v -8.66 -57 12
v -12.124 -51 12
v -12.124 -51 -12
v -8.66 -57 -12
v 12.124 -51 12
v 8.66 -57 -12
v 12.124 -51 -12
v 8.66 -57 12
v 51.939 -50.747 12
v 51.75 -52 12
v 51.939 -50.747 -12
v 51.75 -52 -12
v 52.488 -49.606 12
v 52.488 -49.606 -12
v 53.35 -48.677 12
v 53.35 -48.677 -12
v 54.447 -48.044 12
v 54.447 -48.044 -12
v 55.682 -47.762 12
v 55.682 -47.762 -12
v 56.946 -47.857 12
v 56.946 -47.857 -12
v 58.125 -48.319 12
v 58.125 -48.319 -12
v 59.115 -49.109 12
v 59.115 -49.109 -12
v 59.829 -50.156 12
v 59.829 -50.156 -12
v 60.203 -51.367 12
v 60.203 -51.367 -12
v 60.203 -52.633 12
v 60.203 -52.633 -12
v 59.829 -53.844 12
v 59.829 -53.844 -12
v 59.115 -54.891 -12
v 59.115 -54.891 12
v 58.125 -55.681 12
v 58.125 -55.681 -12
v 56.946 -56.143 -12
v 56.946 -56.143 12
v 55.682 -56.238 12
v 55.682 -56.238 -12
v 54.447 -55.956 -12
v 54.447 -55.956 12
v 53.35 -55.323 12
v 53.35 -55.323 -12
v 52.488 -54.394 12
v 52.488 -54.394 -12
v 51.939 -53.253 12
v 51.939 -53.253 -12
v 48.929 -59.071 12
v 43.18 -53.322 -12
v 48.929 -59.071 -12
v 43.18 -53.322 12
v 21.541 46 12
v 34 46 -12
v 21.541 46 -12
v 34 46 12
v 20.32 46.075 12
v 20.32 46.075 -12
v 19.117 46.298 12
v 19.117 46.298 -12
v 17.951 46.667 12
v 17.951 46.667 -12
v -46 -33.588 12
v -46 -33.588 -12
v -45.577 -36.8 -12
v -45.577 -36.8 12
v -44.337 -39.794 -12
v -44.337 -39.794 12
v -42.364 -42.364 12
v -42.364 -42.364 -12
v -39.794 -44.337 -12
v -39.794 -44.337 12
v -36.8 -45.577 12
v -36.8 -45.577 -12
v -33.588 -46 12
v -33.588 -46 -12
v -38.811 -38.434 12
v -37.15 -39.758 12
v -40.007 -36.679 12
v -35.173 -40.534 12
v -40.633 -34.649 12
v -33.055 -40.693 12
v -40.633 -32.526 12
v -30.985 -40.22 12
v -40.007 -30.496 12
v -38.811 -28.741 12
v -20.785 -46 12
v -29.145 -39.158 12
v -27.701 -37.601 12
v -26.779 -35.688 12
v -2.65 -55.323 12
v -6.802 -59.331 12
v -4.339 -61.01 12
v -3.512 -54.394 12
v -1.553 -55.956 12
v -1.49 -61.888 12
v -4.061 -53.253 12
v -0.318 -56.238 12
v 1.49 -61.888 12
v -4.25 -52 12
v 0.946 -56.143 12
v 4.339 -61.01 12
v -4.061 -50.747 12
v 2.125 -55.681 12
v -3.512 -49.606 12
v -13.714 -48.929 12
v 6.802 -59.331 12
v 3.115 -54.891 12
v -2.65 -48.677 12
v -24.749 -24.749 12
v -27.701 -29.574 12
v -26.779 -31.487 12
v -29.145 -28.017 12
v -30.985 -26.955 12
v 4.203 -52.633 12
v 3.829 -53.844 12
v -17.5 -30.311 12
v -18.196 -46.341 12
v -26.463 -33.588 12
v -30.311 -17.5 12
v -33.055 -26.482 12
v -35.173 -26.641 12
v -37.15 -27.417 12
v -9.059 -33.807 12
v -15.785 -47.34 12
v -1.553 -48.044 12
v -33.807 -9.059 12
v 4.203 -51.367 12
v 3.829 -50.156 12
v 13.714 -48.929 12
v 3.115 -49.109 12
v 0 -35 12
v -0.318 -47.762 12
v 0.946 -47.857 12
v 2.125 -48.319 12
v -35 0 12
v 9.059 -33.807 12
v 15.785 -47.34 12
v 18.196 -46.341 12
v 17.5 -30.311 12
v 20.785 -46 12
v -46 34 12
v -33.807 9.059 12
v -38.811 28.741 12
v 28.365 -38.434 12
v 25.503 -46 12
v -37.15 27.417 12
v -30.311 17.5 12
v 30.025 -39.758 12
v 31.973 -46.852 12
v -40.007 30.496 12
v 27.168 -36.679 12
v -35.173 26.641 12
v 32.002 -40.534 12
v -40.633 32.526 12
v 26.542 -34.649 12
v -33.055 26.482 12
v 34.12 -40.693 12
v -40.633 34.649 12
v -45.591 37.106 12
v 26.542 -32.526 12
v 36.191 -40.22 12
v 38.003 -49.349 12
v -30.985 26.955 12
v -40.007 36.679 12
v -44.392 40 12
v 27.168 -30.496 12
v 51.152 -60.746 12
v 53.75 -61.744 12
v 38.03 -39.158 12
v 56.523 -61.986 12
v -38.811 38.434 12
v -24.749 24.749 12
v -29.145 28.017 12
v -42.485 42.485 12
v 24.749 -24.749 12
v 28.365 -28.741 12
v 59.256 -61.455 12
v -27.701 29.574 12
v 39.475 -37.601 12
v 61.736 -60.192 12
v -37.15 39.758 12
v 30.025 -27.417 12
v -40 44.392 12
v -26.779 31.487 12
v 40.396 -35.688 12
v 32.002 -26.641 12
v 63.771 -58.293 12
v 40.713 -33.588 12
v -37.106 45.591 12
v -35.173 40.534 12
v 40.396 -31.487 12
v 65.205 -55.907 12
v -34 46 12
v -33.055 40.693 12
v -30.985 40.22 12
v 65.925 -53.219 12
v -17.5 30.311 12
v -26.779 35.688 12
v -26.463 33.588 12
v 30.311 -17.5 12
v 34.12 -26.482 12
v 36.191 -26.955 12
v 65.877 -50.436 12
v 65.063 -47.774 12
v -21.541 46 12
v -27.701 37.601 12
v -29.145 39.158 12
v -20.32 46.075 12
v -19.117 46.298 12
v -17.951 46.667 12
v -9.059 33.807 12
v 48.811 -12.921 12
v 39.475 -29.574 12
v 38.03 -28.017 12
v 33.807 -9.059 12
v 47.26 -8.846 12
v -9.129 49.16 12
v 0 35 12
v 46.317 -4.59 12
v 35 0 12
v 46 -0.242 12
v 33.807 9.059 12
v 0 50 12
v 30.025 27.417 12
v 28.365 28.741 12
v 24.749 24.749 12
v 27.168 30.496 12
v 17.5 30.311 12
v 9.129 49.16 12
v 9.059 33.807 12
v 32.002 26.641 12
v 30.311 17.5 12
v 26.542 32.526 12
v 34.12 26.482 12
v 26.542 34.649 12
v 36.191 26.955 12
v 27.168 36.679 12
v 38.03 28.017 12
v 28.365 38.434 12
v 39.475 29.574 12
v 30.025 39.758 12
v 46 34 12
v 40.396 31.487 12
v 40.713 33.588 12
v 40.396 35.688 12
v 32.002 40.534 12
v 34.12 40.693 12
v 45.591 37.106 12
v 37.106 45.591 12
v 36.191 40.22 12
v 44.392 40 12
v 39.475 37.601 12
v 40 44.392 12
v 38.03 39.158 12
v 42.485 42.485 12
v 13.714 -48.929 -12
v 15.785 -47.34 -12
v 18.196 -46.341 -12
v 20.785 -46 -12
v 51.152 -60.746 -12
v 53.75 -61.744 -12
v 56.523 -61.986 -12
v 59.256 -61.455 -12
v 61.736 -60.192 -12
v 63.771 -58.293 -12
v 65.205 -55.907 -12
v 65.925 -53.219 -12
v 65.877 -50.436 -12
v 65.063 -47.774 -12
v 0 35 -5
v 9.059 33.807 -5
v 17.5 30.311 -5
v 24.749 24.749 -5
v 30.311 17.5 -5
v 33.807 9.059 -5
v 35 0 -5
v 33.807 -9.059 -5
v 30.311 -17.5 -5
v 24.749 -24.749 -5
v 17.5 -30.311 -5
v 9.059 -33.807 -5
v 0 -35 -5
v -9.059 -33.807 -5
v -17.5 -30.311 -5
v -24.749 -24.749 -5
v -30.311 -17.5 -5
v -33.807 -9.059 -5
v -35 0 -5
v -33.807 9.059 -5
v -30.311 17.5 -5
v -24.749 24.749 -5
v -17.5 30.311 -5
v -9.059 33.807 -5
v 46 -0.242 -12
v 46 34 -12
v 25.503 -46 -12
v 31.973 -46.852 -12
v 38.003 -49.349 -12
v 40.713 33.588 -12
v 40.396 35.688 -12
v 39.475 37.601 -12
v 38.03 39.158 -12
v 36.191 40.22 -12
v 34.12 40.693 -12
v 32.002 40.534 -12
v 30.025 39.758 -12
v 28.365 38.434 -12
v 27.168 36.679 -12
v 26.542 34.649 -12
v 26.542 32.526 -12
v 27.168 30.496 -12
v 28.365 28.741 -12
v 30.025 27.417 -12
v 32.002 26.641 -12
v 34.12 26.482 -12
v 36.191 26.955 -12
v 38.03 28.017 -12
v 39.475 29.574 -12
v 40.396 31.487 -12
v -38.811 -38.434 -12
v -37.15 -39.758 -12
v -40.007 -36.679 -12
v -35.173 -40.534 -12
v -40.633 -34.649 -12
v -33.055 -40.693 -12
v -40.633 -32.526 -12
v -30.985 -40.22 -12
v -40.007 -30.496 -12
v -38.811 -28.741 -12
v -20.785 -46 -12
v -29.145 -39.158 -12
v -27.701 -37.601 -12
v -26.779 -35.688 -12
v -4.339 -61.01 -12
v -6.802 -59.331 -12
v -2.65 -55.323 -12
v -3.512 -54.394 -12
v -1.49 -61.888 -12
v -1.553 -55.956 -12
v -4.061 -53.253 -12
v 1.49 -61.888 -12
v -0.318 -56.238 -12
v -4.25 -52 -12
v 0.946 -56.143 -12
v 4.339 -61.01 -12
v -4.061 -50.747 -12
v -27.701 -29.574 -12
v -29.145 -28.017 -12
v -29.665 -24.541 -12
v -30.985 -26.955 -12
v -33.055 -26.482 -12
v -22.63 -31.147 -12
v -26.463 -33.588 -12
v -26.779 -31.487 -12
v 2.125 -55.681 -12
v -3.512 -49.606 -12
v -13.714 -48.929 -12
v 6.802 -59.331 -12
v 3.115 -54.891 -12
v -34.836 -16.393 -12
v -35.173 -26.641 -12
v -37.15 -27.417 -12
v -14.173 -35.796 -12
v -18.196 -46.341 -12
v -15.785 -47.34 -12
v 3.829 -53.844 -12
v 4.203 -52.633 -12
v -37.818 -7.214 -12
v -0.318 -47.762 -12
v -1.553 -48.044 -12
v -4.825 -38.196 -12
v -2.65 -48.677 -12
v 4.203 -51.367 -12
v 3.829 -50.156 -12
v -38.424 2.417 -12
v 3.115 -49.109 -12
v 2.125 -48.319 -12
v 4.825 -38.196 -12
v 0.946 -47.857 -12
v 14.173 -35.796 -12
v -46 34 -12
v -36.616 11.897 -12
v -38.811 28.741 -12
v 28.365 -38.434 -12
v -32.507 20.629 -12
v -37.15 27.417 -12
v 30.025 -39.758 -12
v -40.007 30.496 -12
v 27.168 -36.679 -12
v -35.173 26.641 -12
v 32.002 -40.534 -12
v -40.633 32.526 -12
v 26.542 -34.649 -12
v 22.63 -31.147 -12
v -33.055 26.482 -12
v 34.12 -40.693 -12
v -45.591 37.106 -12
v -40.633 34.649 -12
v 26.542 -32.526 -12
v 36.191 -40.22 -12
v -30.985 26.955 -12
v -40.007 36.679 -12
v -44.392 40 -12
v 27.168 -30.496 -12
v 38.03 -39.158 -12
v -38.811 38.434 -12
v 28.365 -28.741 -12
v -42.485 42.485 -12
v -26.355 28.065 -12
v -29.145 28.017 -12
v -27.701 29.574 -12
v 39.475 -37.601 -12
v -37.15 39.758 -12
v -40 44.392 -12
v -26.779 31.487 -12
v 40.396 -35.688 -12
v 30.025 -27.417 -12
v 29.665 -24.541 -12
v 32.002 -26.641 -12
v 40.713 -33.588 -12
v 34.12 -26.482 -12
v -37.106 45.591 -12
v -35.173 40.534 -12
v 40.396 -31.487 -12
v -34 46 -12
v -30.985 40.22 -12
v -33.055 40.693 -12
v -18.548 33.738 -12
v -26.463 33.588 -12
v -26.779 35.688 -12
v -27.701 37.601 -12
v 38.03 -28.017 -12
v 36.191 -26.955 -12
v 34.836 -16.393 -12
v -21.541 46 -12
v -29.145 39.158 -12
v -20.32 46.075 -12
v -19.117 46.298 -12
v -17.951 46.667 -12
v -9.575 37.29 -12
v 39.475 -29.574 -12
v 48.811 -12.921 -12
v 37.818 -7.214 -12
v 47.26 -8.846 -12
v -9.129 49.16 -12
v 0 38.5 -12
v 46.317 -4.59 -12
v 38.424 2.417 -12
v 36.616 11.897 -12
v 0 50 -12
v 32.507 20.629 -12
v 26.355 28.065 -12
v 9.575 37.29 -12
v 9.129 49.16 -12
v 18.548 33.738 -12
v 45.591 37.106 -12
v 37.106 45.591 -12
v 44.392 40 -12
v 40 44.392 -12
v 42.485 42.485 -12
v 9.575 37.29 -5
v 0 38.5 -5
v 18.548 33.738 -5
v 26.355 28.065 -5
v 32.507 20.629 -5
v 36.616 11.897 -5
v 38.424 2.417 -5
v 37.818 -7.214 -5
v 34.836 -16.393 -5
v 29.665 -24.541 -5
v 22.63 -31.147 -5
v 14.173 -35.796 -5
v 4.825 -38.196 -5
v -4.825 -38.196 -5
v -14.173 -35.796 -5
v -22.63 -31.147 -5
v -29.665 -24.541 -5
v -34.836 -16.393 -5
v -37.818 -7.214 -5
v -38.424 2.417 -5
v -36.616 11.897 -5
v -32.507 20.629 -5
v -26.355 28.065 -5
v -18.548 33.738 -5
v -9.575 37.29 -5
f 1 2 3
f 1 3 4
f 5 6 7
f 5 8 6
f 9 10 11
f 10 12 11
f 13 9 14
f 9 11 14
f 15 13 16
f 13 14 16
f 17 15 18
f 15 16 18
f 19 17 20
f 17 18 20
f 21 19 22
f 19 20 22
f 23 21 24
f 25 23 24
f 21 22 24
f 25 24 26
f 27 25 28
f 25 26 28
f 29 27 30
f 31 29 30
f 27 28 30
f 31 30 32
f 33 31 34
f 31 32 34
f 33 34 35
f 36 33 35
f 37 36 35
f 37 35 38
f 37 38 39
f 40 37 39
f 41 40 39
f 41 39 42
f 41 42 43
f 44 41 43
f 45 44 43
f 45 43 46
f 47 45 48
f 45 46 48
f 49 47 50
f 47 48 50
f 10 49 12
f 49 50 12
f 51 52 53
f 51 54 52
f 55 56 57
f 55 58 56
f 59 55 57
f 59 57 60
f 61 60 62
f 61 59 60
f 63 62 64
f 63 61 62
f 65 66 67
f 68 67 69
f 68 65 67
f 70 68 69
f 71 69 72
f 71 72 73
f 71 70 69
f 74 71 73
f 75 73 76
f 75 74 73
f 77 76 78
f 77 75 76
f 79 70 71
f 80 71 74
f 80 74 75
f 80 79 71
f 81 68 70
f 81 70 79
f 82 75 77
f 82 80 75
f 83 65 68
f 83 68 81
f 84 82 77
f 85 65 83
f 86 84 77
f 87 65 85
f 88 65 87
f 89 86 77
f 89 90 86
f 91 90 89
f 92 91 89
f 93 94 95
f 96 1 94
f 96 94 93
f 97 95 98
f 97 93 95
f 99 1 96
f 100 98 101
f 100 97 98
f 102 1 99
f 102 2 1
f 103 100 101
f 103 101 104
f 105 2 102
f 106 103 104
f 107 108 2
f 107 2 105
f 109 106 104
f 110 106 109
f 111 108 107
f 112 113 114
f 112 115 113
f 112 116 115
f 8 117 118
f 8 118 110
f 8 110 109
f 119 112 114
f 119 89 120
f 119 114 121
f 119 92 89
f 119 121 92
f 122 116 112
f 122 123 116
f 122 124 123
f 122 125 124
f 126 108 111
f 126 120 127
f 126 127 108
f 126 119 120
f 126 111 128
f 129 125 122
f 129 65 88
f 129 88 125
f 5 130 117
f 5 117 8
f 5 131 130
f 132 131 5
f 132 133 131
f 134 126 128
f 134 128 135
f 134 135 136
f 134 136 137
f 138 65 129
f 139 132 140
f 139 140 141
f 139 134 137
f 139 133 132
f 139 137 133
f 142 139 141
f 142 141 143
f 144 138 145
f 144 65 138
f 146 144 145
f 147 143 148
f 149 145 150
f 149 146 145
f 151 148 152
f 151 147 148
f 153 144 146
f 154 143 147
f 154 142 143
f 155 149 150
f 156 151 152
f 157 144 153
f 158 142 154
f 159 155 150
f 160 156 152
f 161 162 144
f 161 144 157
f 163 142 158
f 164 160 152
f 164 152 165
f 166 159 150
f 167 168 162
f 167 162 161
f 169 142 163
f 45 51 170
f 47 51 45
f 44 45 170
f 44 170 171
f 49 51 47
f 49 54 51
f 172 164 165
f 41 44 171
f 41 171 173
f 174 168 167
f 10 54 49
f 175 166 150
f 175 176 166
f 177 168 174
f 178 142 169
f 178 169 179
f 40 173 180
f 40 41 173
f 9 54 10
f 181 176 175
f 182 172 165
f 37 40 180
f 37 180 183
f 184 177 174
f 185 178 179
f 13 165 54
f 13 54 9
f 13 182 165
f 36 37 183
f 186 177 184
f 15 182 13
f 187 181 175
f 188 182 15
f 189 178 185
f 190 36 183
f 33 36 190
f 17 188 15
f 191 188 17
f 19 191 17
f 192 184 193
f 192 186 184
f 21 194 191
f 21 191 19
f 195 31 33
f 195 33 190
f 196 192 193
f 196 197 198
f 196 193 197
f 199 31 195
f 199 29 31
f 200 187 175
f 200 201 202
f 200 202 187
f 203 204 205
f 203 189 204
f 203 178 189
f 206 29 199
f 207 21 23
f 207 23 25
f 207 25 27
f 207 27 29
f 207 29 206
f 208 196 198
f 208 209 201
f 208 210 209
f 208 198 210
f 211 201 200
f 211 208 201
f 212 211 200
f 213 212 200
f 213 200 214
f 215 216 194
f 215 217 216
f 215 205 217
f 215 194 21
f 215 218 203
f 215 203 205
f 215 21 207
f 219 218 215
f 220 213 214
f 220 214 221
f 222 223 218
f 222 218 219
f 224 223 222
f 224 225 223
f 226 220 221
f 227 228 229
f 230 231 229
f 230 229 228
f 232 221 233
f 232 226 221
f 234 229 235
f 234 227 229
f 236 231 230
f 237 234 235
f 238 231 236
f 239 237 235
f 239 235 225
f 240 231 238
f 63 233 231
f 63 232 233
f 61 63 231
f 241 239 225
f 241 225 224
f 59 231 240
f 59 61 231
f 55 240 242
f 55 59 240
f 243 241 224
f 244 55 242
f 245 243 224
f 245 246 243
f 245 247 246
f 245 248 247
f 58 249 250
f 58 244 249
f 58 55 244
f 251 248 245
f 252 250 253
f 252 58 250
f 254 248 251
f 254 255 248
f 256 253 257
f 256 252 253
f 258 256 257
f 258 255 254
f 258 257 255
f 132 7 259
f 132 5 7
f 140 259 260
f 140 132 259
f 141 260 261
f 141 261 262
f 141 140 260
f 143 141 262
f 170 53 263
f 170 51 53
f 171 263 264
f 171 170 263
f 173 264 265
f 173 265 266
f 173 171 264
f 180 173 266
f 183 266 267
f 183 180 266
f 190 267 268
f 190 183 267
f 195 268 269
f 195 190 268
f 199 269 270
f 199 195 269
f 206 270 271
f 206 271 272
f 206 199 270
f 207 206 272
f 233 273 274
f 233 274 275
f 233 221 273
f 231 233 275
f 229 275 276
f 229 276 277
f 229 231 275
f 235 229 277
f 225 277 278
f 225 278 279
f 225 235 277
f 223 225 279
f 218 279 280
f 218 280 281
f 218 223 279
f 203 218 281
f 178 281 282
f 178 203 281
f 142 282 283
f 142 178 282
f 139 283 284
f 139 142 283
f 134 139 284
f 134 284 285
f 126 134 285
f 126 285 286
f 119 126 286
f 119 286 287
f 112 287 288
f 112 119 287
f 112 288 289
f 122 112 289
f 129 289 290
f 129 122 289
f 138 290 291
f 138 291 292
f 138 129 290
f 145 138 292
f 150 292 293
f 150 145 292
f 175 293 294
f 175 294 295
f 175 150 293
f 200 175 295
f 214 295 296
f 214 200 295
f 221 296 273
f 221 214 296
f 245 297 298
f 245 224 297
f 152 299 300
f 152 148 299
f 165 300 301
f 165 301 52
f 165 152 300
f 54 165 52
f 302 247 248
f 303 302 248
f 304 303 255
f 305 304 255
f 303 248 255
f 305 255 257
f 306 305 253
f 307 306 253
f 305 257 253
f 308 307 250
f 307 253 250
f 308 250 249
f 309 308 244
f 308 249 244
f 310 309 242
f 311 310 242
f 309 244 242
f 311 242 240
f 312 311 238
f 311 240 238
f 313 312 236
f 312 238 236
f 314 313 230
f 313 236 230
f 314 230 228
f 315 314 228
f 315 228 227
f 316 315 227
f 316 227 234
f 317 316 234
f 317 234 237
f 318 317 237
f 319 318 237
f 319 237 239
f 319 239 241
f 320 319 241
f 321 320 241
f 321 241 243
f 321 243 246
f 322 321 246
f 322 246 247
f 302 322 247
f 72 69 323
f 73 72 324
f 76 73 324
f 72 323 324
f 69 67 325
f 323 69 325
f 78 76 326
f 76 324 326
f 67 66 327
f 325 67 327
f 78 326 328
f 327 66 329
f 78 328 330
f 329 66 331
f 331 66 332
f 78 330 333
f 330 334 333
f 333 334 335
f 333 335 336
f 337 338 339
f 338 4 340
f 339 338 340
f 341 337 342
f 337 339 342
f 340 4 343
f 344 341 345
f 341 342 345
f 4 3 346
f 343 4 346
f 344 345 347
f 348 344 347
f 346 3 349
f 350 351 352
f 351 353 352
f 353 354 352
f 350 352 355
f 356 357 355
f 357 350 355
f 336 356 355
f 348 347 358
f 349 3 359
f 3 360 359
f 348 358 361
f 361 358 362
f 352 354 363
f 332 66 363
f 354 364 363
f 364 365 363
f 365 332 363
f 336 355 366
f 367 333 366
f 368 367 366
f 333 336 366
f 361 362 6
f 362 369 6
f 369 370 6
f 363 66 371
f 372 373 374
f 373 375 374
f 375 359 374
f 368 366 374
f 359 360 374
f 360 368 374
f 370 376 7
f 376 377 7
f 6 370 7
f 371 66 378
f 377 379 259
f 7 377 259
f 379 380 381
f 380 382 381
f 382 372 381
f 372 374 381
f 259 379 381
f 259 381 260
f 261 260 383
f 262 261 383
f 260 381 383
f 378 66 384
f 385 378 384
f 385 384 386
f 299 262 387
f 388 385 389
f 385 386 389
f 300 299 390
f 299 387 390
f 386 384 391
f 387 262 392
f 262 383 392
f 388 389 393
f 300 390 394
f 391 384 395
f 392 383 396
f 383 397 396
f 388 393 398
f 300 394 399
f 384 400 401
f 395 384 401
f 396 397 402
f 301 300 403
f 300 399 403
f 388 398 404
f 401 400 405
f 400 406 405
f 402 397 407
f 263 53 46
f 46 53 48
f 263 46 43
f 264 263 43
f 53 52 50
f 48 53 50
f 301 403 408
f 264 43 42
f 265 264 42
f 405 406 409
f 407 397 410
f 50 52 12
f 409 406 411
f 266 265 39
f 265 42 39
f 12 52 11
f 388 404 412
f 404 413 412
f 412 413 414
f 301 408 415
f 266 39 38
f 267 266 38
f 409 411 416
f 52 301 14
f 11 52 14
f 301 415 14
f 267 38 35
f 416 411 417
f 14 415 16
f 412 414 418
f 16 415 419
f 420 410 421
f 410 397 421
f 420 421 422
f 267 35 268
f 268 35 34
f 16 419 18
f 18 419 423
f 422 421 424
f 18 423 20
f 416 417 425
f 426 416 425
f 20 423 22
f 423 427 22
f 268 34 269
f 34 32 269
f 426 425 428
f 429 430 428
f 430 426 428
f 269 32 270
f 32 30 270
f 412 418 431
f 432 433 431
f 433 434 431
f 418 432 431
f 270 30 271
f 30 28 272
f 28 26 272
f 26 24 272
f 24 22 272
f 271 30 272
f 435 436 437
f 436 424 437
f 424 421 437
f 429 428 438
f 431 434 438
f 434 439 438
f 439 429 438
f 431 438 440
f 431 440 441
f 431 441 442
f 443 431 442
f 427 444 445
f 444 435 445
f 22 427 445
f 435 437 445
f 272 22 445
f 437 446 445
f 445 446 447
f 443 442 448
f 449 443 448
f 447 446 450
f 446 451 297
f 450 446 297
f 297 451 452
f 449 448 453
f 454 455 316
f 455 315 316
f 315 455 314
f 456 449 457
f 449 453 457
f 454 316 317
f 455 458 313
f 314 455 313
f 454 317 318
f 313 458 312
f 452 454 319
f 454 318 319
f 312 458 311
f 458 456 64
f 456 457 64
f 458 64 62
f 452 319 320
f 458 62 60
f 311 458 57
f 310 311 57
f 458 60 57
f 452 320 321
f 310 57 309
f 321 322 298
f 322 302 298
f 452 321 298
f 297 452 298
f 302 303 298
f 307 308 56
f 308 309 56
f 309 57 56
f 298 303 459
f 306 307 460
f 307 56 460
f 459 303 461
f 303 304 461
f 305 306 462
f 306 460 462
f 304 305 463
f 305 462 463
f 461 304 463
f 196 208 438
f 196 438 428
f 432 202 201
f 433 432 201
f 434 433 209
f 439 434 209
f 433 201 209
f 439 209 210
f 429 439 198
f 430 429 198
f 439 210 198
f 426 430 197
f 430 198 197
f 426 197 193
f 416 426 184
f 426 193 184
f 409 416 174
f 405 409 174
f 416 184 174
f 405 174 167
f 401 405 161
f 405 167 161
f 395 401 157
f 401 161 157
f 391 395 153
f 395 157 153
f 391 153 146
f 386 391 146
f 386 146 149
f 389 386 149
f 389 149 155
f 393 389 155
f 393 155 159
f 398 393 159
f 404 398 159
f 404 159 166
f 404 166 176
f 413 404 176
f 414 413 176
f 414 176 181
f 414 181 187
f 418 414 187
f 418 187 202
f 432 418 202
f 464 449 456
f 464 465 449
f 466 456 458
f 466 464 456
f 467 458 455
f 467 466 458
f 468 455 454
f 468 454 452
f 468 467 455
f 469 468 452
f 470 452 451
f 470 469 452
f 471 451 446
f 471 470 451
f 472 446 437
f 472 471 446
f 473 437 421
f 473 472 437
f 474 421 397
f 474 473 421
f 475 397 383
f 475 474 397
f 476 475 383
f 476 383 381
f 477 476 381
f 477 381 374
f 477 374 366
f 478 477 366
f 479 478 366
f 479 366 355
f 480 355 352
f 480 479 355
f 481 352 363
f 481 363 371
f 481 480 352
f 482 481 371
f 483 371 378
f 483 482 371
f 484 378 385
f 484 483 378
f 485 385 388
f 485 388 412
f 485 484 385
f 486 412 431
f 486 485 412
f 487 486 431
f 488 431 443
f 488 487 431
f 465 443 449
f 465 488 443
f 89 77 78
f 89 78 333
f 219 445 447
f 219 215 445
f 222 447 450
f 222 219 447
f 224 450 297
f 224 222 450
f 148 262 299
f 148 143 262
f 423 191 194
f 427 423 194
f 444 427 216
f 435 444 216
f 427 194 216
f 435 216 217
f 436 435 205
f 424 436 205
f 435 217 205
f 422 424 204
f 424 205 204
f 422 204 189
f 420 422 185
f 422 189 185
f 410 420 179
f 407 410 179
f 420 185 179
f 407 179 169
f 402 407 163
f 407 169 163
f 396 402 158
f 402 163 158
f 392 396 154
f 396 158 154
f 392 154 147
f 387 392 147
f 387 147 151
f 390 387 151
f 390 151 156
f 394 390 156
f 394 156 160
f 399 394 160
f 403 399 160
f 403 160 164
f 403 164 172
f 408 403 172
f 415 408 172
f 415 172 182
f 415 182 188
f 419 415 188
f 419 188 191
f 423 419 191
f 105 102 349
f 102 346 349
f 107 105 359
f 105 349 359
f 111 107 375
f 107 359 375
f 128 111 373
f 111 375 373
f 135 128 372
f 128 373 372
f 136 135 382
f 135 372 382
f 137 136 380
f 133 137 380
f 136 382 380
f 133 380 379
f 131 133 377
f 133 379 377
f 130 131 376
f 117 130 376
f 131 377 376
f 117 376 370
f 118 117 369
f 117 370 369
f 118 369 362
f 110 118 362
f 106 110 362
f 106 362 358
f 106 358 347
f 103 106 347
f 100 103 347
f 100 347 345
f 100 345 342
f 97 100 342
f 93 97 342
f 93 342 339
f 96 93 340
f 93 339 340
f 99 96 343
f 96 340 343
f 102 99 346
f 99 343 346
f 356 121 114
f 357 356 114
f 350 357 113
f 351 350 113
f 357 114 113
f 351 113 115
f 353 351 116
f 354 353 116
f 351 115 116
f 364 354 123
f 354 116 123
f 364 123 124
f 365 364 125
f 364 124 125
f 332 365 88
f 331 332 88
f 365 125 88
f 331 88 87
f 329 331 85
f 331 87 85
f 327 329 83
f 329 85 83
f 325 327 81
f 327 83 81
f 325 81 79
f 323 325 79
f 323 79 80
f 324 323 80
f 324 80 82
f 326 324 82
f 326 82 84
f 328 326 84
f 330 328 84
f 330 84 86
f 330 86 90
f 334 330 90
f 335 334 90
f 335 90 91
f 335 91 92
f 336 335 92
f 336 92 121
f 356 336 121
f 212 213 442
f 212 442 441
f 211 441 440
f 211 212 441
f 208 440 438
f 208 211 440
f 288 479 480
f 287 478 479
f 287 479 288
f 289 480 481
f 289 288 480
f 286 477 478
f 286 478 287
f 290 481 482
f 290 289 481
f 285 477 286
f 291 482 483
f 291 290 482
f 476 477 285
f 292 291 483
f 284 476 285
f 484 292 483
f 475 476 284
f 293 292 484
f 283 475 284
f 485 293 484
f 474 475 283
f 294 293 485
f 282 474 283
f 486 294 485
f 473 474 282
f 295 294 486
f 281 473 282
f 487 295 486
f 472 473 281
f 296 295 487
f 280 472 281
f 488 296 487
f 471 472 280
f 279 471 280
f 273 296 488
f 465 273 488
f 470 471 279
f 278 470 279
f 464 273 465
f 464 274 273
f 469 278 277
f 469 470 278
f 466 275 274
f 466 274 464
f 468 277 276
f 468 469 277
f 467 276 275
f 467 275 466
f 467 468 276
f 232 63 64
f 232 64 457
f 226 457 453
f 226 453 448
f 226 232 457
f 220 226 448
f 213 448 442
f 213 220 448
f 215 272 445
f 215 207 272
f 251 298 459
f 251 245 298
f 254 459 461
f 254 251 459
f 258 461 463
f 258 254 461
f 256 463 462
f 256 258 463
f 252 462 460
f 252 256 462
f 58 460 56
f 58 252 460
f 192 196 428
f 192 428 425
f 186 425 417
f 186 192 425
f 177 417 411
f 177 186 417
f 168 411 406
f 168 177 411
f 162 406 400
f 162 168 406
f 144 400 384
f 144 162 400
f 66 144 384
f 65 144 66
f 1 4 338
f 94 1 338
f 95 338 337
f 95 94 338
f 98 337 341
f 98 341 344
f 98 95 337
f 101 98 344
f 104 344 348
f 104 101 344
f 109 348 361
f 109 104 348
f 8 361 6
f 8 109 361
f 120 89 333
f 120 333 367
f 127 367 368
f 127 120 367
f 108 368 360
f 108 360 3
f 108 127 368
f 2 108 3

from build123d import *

# Parameters (mm, degrees)
SKETCH1_R              = 31
BASE_EXTRUDE_DEPTH     = 12
M10_GEVINDHULLER_D     = 8.5
M10_GEVINDHULLER_DEPTH = 24
M10_GEVINDHULLER_TIP   = 2.553657631
SKETCH7_R              = 7.125
F_14_25_HULLER_DEPTH   = 25


with BuildPart() as part:
    # Sketch1 → Base-Extrude (new body, symmetric)
    with BuildSketch(Plane.XY):
        with BuildLine():
            Line((34, 46), (21.540659229, 46))
            ThreePointArc((21.540659229, 46), (19.71491737, 46.168079197), (17.950549357, 46.666666667))
            ThreePointArc((17.950549357, 46.666666667), (0, 50), (-17.950549357, 46.666666667))
            ThreePointArc((-17.950549357, 46.666666667), (-19.71491737, 46.168079197), (-21.540659229, 46))
            Line((-21.540659229, 46), (-34, 46))
            ThreePointArc((-34, 46), (-42.485281374, 42.485281374), (-46, 34))
            Line((-46, 34), (-46, 0))
            Line((-46, 0), (-46, -33.587572106))
            ThreePointArc((-46, -33.587572106), (-42.364484041, -42.364484041), (-33.587572106, -46))
            Line((-33.587572106, -46), (-20.784609691, -46))
            ThreePointArc((-20.784609691, -46), (-15.784609691, -47.339745962), (-12.124355653, -51))
            Line((-12.124355653, -51), (-8.660254038, -57))
            ThreePointArc((-8.660254038, -57), (0, -62), (8.660254038, -57))
            Line((8.660254038, -57), (12.124355653, -51))
            ThreePointArc((12.124355653, -51), (15.784609691, -47.339745962), (20.784609691, -46))
            Line((20.784609691, -46), (25.502525317, -46))
            ThreePointArc((25.502525317, -46), (35.069611126, -47.903011687), (43.180194847, -53.32233047))
            Line((43.180194847, -53.32233047), (48.928932188, -59.071067812))
            ThreePointArc((48.928932188, -59.071067812), (61.735764364, -60.191520443), (65.06307787, -47.773817383))
            Line((65.06307787, -47.773817383), (48.810766389, -12.920622936))
            ThreePointArc((48.810766389, -12.920622936), (46.711119786, -6.735263502), (46, -0.242075084))
            Line((46, -0.242075084), (46, 34))
            ThreePointArc((46, 34), (42.485281374, 42.485281374), (34, 46))
        make_face()
        Circle(SKETCH1_R, mode=Mode.SUBTRACT)
    extrude(amount=BASE_EXTRUDE_DEPTH, both=True)

    # Sketch2 → Uddrejning (revolve, cut)
    with BuildSketch(Plane(origin=(0, 0, 0), x_dir=(0, 0, -1), z_dir=(1, 0, 0))):
        Polygon((12, 38.5), (5, 38.5), (5, 35), (-12, 35), (-12, 0), (12, 0), align=None)
    revolve(axis=Axis((0, 0, 0), (0, 0, -1)), mode=Mode.SUBTRACT)

    # M10 gevindhuller
    with Locations(Plane.XY.offset(12)):
        with Locations((56, -52), (0, -52)):
            Hole(M10_GEVINDHULLER_D / 2, depth=M10_GEVINDHULLER_DEPTH)
            with Locations((0, 0, -(M10_GEVINDHULLER_DEPTH + M10_GEVINDHULLER_TIP / 2))):  # 118° drill point
                Cone(0, M10_GEVINDHULLER_D / 2, M10_GEVINDHULLER_TIP, mode=Mode.SUBTRACT)

    # Sketch7 → ø14.25 huller (cut, through all)
    with BuildSketch(Plane.XY.offset(12)):
        with Locations((33.587572106, 33.587572106)):
            Circle(SKETCH7_R)
        with Locations((33.587572106, -33.587572106)):
            Circle(SKETCH7_R)
        with Locations((-33.587572106, -33.587572106)):
            Circle(SKETCH7_R)
        with Locations((-33.587572106, 33.587572106)):
            Circle(SKETCH7_R)
    extrude(amount=-F_14_25_HULLER_DEPTH, mode=Mode.SUBTRACT)


solid = part.part
